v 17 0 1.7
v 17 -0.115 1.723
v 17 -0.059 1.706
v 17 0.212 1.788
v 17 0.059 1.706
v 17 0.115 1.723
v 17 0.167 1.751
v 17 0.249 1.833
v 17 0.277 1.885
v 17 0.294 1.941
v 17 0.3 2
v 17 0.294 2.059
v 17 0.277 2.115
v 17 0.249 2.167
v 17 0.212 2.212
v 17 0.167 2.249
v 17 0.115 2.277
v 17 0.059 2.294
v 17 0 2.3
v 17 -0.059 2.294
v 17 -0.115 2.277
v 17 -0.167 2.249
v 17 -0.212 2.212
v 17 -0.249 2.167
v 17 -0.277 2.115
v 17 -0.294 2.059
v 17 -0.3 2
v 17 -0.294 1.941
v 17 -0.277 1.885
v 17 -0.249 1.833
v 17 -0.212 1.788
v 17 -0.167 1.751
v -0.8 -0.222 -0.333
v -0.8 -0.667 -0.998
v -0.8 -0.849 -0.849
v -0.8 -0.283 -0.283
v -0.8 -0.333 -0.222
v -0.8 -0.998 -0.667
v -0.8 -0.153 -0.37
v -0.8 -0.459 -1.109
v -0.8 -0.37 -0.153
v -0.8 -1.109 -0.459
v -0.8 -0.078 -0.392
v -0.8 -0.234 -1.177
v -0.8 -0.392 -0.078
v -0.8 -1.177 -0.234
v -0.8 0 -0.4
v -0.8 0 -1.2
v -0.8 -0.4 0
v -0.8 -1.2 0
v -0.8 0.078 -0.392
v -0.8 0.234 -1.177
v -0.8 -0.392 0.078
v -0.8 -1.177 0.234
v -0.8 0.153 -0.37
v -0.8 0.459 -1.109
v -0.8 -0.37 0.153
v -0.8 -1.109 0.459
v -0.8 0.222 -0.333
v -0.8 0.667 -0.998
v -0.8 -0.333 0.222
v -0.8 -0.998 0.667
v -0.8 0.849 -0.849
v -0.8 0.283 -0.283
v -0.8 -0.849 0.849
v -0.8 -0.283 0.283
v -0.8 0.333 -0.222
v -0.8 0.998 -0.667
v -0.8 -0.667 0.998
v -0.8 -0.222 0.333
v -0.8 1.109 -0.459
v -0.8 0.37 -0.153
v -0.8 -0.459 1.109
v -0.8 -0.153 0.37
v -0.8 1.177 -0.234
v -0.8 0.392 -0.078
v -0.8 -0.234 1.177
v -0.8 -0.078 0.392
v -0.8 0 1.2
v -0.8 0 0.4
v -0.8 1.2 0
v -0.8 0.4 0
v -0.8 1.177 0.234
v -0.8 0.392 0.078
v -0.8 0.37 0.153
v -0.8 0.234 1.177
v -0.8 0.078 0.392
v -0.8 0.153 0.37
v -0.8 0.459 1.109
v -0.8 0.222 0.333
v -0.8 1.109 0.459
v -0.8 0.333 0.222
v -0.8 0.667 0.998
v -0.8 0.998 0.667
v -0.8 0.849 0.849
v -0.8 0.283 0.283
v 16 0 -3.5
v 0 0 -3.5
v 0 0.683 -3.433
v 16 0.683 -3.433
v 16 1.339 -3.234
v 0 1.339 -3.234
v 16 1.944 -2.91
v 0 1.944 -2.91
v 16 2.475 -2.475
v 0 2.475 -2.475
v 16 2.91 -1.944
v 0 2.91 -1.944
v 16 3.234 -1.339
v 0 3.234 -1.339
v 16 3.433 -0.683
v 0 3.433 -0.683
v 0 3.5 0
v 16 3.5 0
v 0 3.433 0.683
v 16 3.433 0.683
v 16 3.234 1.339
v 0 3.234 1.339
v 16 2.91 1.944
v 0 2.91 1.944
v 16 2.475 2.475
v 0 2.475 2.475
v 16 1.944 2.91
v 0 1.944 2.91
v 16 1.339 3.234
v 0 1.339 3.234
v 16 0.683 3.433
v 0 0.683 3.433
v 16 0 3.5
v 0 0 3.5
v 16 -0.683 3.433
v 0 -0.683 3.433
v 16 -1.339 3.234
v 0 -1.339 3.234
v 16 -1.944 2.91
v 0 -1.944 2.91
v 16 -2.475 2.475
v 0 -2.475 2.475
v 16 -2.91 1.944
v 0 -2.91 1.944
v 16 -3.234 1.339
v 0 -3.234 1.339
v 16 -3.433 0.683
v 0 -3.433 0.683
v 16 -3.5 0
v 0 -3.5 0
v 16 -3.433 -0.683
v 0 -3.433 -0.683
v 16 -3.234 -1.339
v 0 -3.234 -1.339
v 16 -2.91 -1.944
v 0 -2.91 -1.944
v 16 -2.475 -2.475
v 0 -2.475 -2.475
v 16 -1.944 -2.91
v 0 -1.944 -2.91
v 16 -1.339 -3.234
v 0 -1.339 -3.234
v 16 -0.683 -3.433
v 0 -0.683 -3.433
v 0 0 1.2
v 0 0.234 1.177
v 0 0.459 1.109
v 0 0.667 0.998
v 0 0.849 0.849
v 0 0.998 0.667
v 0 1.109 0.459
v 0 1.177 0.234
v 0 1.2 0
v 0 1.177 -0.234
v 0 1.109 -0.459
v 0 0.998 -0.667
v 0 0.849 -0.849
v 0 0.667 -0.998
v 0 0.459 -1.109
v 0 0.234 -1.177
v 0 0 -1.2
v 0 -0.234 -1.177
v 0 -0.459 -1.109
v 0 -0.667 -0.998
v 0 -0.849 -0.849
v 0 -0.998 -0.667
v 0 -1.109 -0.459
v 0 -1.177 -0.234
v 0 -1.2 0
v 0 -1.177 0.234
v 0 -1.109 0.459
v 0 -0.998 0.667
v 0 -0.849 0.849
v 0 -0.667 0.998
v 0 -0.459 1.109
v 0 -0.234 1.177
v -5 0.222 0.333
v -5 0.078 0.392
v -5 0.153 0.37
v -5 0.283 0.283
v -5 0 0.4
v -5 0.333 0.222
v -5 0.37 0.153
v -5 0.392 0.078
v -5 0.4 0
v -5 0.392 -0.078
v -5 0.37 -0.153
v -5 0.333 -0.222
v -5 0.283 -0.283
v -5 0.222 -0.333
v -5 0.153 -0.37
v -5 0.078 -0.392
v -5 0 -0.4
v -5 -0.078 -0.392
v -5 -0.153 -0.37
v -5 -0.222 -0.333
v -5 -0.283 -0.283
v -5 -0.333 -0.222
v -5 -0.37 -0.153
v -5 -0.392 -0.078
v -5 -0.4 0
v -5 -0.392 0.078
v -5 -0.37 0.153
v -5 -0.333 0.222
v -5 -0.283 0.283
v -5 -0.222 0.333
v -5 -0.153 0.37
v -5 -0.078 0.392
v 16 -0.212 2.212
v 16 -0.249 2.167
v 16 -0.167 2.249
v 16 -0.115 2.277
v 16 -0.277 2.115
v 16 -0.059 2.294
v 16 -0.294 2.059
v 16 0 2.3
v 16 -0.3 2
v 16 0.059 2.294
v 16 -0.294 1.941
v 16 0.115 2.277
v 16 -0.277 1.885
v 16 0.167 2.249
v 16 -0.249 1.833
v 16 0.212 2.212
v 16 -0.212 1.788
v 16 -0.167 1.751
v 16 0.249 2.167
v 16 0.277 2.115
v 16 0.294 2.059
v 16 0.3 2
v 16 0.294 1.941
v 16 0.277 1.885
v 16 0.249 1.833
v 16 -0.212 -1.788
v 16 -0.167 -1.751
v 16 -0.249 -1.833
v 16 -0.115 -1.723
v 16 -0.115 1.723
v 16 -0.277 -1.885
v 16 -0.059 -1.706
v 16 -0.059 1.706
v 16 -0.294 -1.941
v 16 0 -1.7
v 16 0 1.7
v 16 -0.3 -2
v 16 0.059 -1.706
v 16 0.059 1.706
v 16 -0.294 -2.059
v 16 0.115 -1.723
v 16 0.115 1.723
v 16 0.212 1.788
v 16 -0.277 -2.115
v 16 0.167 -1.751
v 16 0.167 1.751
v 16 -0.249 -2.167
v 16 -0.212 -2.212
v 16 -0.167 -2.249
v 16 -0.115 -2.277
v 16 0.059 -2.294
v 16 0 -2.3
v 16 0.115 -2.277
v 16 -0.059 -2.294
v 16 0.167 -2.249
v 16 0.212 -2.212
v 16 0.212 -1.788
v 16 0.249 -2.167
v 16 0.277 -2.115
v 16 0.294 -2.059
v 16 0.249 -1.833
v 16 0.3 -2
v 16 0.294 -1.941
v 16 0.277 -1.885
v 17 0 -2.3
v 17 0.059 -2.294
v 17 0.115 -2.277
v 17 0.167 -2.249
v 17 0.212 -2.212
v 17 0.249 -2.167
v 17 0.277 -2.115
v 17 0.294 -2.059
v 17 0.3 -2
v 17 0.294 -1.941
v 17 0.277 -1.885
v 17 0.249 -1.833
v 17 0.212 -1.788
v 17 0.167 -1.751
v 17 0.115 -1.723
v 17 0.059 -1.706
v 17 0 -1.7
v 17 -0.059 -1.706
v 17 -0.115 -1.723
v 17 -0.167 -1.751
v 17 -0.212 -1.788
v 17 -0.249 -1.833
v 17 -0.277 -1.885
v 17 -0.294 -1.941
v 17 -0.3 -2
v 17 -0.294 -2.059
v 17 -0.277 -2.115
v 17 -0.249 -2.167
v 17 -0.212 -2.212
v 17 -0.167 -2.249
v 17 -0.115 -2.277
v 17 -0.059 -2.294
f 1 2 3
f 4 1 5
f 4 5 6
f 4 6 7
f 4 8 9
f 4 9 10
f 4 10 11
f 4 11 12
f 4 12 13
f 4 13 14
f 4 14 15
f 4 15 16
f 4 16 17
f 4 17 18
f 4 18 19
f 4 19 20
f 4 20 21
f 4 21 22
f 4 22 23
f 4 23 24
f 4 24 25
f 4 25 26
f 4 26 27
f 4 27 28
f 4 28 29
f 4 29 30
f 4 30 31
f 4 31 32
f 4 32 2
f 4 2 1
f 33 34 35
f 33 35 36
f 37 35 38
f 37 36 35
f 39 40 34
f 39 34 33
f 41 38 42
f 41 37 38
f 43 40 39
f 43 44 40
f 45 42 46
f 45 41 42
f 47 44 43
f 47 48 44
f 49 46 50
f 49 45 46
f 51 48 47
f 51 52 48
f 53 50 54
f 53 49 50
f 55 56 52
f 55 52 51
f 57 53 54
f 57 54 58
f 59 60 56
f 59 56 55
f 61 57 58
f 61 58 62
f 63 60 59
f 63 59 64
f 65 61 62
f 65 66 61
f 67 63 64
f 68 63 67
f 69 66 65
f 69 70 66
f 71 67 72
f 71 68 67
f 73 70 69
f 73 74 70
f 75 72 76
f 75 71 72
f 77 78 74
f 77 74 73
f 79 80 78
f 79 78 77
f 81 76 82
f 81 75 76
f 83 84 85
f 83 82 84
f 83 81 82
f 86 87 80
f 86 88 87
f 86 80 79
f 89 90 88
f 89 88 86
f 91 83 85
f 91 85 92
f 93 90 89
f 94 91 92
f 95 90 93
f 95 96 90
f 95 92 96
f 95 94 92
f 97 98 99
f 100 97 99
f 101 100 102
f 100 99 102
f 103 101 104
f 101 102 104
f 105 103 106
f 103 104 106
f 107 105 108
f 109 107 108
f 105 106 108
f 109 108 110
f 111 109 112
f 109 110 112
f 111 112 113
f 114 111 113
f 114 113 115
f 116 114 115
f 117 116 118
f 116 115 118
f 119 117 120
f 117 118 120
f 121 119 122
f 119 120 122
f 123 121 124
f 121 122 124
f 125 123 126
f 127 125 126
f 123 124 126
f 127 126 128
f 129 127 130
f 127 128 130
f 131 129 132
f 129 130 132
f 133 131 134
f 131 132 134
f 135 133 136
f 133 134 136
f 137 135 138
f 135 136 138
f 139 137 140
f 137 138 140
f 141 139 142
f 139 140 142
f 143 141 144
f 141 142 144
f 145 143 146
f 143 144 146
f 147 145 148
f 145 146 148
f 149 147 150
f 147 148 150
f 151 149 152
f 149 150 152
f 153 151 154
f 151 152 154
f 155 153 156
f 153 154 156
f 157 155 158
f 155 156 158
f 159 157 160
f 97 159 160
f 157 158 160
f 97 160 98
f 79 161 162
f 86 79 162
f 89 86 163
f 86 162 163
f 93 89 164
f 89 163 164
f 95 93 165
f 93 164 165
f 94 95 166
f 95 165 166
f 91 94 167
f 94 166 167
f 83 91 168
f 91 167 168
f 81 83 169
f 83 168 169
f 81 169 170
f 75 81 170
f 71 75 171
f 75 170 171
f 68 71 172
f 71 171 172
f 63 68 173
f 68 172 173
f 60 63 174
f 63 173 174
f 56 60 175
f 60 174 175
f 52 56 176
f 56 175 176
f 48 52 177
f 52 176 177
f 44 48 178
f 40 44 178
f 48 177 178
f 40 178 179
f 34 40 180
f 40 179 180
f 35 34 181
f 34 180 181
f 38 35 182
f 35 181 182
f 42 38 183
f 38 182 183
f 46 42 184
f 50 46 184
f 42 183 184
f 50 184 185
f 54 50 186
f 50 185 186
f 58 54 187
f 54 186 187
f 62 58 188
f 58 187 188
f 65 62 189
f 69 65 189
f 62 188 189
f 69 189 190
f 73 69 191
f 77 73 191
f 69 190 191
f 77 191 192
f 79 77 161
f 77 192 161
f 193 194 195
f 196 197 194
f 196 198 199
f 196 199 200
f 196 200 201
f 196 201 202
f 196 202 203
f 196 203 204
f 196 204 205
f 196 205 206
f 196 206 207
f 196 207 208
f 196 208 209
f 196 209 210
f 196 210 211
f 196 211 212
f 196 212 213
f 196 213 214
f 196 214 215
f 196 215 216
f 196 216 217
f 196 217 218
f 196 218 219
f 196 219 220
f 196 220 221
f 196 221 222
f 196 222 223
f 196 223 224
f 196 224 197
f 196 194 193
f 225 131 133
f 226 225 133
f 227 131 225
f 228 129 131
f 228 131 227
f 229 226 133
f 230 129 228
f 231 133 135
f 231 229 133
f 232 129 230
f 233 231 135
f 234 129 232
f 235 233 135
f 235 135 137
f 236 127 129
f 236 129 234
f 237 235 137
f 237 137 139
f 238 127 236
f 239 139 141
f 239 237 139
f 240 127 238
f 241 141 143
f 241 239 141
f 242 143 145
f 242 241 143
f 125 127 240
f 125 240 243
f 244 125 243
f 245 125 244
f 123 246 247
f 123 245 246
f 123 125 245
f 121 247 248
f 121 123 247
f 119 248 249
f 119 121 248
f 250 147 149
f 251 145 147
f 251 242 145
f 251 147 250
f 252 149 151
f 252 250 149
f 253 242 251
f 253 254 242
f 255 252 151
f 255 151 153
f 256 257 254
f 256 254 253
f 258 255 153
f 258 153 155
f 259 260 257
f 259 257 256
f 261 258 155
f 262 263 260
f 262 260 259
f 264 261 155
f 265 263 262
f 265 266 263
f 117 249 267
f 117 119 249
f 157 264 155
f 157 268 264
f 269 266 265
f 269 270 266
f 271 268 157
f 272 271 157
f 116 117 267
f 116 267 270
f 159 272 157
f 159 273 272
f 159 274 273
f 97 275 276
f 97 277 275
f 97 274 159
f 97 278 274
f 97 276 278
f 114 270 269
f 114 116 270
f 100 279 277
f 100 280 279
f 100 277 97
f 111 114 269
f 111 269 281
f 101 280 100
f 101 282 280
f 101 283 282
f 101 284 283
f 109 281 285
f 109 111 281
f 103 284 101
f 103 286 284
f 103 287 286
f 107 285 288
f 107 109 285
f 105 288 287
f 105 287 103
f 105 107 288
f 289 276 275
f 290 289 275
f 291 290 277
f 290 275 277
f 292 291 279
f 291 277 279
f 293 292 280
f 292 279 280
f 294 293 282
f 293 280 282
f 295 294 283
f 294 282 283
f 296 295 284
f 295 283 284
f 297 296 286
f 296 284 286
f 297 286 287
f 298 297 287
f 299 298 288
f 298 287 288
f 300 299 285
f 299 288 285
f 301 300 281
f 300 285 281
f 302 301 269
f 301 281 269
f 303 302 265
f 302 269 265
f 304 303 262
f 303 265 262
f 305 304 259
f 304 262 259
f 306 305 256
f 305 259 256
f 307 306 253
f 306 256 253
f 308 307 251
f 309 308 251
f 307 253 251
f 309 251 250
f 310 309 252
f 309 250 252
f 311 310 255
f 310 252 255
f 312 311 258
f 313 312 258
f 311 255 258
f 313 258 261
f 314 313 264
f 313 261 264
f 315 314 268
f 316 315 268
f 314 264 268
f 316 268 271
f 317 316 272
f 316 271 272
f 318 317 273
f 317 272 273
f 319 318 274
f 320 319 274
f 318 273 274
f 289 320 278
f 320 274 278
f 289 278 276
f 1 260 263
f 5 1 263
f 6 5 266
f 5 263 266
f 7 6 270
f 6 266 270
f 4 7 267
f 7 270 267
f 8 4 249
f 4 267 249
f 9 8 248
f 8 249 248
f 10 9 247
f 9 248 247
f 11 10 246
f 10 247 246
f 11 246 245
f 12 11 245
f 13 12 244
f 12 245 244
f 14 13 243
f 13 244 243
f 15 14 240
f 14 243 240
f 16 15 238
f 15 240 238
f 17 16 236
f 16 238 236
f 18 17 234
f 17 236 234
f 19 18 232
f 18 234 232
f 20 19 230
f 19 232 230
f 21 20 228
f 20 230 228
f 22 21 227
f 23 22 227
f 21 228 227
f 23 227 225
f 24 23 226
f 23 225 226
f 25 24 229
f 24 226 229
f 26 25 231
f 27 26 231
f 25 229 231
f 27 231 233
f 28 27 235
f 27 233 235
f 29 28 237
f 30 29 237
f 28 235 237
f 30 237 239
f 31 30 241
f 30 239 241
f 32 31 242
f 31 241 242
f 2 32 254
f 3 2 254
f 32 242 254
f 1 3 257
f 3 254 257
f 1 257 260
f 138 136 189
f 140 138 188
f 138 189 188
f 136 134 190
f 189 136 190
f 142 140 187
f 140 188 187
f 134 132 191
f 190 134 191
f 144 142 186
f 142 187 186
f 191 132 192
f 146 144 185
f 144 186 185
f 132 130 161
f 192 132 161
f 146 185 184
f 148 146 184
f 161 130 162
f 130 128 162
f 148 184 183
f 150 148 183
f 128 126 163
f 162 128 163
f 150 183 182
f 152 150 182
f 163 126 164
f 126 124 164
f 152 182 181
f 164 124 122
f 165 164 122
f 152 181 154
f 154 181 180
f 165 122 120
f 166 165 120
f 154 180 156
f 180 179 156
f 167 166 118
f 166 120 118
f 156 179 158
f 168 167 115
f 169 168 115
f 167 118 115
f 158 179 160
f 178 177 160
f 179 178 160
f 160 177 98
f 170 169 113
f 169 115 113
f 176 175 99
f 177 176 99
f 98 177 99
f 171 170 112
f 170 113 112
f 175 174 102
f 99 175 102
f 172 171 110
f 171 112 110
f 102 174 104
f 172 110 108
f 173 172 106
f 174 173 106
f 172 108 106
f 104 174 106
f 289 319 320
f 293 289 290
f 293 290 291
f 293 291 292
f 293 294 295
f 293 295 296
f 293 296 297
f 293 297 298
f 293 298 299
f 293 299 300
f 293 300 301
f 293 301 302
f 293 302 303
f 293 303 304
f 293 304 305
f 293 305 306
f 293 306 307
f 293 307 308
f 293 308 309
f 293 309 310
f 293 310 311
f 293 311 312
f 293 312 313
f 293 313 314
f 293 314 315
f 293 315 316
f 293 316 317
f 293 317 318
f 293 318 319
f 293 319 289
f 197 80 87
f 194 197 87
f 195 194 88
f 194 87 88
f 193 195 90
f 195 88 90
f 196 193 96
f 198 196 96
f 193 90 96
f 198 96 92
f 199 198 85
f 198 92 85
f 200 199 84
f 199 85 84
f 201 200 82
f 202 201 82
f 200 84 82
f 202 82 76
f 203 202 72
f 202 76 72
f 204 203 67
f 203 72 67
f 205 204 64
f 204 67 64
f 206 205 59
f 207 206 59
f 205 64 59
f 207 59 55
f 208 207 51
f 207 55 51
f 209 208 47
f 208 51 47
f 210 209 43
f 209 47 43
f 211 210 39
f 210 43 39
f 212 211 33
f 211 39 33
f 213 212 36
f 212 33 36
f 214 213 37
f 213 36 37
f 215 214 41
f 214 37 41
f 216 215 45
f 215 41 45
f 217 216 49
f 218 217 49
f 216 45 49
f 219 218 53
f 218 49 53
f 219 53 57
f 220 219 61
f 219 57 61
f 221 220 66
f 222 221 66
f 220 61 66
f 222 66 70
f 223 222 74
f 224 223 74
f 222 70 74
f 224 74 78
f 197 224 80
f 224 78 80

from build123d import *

# Parameters (mm, degrees)
SKETCH1_R           = 3.5
BOSS_EXTRUDE1_DEPTH = 16
SKETCH2_R           = 1.2
BOSS_EXTRUDE2_DEPTH = 0.8
SKETCH3_R           = 0.4
BOSS_EXTRUDE3_DEPTH = 4.2
SKETCH4_R           = 0.3
BOSS_EXTRUDE4_DEPTH = 1


with BuildPart() as part:
    # Sketch1 → Boss-Extrude1 (new body)
    with BuildSketch(Plane(origin=(0, 0, 0), x_dir=(0, 0, -1), z_dir=(1, 0, 0))):
        Circle(SKETCH1_R)
    extrude(amount=BOSS_EXTRUDE1_DEPTH)

    # Sketch2 → Boss-Extrude2 (add)
    with BuildSketch(Plane.ZY):
        Circle(SKETCH2_R)
    extrude(amount=BOSS_EXTRUDE2_DEPTH)

    # Sketch3 → Boss-Extrude3 (add)
    with BuildSketch(Plane.ZY.offset(0.8)):
        Circle(SKETCH3_R)
    extrude(amount=BOSS_EXTRUDE3_DEPTH)

    # Sketch4 → Boss-Extrude4 (add)
    with BuildSketch(Plane(origin=(16, 0, 0), x_dir=(0, 0, -1), z_dir=(1, 0, 0))):
        with Locations((-2, 0)):
            Circle(SKETCH4_R)
        with Locations((2, 0)):
            Circle(SKETCH4_R)
    extrude(amount=BOSS_EXTRUDE4_DEPTH)


solid = part.part
